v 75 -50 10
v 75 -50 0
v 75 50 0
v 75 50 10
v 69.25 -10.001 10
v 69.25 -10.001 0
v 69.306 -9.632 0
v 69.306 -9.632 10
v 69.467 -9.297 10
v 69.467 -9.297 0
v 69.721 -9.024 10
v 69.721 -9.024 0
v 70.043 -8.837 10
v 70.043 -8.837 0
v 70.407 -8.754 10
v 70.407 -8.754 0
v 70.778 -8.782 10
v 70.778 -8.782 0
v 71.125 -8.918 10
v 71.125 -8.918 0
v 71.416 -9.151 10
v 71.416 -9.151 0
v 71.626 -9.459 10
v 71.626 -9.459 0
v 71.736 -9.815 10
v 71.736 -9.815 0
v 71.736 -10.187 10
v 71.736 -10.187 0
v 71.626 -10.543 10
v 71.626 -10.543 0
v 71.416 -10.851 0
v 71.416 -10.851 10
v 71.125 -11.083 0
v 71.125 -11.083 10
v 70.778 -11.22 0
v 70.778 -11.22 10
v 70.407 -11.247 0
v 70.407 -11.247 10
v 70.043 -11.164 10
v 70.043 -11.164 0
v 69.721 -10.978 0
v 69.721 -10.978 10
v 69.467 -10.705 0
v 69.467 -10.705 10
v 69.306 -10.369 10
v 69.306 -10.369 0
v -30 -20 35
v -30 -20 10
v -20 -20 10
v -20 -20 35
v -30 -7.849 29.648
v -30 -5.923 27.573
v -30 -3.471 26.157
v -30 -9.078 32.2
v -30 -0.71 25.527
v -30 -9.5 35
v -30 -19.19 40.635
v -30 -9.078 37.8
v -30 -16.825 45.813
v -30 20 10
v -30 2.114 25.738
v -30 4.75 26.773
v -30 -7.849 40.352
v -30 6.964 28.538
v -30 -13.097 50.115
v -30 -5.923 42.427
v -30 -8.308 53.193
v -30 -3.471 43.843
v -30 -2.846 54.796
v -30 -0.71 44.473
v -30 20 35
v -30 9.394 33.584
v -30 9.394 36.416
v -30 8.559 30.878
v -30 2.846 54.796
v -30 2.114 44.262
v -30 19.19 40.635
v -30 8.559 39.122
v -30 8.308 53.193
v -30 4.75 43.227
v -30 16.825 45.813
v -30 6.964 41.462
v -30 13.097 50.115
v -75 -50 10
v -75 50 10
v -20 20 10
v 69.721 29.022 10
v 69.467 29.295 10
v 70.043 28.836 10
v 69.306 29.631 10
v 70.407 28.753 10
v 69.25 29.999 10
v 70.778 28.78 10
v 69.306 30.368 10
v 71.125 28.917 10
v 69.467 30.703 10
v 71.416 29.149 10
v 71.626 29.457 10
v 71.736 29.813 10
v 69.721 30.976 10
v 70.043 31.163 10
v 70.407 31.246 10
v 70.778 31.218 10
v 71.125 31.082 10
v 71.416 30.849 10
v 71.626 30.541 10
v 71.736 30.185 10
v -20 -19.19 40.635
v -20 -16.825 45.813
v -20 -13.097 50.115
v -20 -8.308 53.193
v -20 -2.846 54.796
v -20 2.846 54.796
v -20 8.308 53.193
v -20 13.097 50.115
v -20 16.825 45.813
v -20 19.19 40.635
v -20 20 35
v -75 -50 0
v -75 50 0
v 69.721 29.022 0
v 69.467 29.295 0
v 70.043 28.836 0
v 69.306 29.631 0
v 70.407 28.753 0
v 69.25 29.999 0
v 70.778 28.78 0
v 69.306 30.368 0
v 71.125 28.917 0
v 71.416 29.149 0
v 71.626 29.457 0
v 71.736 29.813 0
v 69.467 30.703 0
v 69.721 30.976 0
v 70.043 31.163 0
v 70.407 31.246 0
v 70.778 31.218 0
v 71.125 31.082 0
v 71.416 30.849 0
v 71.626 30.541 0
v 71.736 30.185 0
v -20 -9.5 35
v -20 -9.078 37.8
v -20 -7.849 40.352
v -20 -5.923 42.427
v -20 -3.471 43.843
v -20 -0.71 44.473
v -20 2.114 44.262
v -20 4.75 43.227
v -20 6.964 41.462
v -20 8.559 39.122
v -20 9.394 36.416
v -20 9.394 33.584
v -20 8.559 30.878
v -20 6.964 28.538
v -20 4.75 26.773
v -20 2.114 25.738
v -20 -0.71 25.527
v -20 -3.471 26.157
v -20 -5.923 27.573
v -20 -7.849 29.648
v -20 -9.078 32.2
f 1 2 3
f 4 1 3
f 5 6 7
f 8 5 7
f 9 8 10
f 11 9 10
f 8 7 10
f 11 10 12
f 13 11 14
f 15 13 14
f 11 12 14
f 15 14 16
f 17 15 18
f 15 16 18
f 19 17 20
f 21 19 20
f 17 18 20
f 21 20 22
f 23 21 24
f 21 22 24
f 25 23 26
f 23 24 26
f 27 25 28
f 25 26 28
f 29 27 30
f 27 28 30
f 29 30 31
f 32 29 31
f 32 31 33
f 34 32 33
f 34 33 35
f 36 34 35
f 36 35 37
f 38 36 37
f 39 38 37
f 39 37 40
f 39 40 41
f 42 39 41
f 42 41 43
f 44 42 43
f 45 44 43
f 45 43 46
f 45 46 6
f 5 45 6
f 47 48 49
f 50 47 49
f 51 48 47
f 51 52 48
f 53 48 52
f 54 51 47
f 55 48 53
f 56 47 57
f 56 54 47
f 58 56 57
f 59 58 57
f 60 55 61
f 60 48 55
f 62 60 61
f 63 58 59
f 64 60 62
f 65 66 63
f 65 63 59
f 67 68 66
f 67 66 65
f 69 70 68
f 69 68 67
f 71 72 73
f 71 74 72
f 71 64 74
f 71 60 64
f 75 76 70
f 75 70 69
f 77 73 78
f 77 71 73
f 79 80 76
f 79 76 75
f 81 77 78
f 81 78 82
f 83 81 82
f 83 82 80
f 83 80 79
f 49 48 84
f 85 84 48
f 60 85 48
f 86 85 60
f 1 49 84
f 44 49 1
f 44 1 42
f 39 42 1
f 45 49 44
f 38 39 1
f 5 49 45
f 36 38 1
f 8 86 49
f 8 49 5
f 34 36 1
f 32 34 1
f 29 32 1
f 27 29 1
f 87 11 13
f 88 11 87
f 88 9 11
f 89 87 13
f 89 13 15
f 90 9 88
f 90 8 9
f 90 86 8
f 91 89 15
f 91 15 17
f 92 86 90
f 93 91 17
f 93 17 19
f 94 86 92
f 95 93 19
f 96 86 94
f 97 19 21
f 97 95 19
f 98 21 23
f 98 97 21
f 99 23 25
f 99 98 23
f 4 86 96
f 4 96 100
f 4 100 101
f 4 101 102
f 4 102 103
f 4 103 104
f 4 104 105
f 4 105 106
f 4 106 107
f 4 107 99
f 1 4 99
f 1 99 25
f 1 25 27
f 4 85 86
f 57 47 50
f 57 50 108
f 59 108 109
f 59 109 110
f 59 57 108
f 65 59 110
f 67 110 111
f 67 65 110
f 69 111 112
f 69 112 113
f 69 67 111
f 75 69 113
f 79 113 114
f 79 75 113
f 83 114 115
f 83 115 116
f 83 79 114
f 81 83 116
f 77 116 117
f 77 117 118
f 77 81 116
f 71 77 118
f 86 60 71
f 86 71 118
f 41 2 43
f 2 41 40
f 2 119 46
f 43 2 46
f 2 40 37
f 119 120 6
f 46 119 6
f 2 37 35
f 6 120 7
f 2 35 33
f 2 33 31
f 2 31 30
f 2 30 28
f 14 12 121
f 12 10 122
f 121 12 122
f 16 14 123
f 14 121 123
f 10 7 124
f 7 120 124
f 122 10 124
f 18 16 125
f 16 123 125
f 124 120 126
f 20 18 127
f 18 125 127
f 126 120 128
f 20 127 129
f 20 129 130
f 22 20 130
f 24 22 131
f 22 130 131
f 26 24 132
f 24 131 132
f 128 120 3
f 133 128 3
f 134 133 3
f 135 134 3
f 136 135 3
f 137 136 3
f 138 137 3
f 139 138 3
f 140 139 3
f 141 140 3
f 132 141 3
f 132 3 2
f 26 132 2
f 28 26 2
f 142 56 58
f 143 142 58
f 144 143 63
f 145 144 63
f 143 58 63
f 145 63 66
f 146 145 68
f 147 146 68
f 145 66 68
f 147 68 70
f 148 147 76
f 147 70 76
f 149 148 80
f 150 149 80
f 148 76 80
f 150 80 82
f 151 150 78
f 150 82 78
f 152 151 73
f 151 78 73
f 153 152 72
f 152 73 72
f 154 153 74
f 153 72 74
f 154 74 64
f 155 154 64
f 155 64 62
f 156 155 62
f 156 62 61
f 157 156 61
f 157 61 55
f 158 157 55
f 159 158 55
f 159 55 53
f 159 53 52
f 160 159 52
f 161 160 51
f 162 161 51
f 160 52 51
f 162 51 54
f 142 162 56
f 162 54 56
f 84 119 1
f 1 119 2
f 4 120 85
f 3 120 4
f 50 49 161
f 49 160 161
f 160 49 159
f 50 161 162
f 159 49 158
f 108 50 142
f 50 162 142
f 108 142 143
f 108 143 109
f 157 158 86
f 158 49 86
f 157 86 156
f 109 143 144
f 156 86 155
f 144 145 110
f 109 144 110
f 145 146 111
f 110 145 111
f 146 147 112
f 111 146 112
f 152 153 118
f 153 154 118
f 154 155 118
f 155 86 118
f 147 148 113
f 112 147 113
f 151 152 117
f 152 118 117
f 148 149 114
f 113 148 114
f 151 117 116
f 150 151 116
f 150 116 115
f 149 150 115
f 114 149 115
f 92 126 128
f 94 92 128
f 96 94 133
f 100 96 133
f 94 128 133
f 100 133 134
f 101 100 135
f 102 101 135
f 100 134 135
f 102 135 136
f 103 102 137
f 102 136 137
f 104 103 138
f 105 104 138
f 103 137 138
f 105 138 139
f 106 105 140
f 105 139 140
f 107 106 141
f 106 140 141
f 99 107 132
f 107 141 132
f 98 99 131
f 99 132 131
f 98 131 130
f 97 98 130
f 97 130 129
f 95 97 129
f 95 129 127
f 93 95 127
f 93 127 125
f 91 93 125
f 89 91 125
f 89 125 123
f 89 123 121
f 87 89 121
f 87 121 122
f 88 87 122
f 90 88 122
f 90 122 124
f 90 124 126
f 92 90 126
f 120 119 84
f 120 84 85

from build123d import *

# Parameters (mm, degrees)
SKETCH_2_W          = 150
SKETCH_2_H          = 100
EXTRUDE_1_DEPTH     = 10
SKETCH_3_W          = 10
SKETCH_3_H          = 40
EXTRUDE_2_DEPTH     = 35
SKETCH_4_R          = 20
EXTRUDE_3_DEPTH     = 10
SKETCH_5_R          = 9.5
CUT_EXTRUDE_1_DEPTH = 10
M3X0_5_2_D          = 2.5


with BuildPart() as part:
    # ｽｹｯﾁ2 → ﾎﾞｽ - 押し出し1 (new body)
    with BuildSketch(Plane.XY):
        Rectangle(SKETCH_2_W, SKETCH_2_H)
    extrude(amount=EXTRUDE_1_DEPTH)

    # ｽｹｯﾁ3 → ﾎﾞｽ - 押し出し2 (add)
    with BuildSketch(Plane.XY):
        with Locations((-25, 0)):
            Rectangle(SKETCH_3_W, SKETCH_3_H)
    extrude(amount=EXTRUDE_2_DEPTH)

    # ｽｹｯﾁ4 → ﾎﾞｽ - 押し出し3 (add)
    with BuildSketch(Plane.ZY.offset(30)):
        with Locations((35, 0)):
            Circle(SKETCH_4_R)
    extrude(amount=-EXTRUDE_3_DEPTH)

    # ｽｹｯﾁ5 → ｶｯﾄ - 押し出し1 (cut)
    with BuildSketch(Plane.ZY.offset(30)):
        with Locations(Location((35, 0, 0), (0, 0, 270))):
            Circle(SKETCH_5_R)
    extrude(amount=-CUT_EXTRUDE_1_DEPTH, mode=Mode.SUBTRACT)

    # M3x0.5 ねじ穴2 (through all)
    with Locations(Plane.XY.offset(10)):
        with Locations((70.5, -10.000898701), (70.5, 29.999101299)):
            Hole(M3X0_5_2_D / 2)


solid = part.part
